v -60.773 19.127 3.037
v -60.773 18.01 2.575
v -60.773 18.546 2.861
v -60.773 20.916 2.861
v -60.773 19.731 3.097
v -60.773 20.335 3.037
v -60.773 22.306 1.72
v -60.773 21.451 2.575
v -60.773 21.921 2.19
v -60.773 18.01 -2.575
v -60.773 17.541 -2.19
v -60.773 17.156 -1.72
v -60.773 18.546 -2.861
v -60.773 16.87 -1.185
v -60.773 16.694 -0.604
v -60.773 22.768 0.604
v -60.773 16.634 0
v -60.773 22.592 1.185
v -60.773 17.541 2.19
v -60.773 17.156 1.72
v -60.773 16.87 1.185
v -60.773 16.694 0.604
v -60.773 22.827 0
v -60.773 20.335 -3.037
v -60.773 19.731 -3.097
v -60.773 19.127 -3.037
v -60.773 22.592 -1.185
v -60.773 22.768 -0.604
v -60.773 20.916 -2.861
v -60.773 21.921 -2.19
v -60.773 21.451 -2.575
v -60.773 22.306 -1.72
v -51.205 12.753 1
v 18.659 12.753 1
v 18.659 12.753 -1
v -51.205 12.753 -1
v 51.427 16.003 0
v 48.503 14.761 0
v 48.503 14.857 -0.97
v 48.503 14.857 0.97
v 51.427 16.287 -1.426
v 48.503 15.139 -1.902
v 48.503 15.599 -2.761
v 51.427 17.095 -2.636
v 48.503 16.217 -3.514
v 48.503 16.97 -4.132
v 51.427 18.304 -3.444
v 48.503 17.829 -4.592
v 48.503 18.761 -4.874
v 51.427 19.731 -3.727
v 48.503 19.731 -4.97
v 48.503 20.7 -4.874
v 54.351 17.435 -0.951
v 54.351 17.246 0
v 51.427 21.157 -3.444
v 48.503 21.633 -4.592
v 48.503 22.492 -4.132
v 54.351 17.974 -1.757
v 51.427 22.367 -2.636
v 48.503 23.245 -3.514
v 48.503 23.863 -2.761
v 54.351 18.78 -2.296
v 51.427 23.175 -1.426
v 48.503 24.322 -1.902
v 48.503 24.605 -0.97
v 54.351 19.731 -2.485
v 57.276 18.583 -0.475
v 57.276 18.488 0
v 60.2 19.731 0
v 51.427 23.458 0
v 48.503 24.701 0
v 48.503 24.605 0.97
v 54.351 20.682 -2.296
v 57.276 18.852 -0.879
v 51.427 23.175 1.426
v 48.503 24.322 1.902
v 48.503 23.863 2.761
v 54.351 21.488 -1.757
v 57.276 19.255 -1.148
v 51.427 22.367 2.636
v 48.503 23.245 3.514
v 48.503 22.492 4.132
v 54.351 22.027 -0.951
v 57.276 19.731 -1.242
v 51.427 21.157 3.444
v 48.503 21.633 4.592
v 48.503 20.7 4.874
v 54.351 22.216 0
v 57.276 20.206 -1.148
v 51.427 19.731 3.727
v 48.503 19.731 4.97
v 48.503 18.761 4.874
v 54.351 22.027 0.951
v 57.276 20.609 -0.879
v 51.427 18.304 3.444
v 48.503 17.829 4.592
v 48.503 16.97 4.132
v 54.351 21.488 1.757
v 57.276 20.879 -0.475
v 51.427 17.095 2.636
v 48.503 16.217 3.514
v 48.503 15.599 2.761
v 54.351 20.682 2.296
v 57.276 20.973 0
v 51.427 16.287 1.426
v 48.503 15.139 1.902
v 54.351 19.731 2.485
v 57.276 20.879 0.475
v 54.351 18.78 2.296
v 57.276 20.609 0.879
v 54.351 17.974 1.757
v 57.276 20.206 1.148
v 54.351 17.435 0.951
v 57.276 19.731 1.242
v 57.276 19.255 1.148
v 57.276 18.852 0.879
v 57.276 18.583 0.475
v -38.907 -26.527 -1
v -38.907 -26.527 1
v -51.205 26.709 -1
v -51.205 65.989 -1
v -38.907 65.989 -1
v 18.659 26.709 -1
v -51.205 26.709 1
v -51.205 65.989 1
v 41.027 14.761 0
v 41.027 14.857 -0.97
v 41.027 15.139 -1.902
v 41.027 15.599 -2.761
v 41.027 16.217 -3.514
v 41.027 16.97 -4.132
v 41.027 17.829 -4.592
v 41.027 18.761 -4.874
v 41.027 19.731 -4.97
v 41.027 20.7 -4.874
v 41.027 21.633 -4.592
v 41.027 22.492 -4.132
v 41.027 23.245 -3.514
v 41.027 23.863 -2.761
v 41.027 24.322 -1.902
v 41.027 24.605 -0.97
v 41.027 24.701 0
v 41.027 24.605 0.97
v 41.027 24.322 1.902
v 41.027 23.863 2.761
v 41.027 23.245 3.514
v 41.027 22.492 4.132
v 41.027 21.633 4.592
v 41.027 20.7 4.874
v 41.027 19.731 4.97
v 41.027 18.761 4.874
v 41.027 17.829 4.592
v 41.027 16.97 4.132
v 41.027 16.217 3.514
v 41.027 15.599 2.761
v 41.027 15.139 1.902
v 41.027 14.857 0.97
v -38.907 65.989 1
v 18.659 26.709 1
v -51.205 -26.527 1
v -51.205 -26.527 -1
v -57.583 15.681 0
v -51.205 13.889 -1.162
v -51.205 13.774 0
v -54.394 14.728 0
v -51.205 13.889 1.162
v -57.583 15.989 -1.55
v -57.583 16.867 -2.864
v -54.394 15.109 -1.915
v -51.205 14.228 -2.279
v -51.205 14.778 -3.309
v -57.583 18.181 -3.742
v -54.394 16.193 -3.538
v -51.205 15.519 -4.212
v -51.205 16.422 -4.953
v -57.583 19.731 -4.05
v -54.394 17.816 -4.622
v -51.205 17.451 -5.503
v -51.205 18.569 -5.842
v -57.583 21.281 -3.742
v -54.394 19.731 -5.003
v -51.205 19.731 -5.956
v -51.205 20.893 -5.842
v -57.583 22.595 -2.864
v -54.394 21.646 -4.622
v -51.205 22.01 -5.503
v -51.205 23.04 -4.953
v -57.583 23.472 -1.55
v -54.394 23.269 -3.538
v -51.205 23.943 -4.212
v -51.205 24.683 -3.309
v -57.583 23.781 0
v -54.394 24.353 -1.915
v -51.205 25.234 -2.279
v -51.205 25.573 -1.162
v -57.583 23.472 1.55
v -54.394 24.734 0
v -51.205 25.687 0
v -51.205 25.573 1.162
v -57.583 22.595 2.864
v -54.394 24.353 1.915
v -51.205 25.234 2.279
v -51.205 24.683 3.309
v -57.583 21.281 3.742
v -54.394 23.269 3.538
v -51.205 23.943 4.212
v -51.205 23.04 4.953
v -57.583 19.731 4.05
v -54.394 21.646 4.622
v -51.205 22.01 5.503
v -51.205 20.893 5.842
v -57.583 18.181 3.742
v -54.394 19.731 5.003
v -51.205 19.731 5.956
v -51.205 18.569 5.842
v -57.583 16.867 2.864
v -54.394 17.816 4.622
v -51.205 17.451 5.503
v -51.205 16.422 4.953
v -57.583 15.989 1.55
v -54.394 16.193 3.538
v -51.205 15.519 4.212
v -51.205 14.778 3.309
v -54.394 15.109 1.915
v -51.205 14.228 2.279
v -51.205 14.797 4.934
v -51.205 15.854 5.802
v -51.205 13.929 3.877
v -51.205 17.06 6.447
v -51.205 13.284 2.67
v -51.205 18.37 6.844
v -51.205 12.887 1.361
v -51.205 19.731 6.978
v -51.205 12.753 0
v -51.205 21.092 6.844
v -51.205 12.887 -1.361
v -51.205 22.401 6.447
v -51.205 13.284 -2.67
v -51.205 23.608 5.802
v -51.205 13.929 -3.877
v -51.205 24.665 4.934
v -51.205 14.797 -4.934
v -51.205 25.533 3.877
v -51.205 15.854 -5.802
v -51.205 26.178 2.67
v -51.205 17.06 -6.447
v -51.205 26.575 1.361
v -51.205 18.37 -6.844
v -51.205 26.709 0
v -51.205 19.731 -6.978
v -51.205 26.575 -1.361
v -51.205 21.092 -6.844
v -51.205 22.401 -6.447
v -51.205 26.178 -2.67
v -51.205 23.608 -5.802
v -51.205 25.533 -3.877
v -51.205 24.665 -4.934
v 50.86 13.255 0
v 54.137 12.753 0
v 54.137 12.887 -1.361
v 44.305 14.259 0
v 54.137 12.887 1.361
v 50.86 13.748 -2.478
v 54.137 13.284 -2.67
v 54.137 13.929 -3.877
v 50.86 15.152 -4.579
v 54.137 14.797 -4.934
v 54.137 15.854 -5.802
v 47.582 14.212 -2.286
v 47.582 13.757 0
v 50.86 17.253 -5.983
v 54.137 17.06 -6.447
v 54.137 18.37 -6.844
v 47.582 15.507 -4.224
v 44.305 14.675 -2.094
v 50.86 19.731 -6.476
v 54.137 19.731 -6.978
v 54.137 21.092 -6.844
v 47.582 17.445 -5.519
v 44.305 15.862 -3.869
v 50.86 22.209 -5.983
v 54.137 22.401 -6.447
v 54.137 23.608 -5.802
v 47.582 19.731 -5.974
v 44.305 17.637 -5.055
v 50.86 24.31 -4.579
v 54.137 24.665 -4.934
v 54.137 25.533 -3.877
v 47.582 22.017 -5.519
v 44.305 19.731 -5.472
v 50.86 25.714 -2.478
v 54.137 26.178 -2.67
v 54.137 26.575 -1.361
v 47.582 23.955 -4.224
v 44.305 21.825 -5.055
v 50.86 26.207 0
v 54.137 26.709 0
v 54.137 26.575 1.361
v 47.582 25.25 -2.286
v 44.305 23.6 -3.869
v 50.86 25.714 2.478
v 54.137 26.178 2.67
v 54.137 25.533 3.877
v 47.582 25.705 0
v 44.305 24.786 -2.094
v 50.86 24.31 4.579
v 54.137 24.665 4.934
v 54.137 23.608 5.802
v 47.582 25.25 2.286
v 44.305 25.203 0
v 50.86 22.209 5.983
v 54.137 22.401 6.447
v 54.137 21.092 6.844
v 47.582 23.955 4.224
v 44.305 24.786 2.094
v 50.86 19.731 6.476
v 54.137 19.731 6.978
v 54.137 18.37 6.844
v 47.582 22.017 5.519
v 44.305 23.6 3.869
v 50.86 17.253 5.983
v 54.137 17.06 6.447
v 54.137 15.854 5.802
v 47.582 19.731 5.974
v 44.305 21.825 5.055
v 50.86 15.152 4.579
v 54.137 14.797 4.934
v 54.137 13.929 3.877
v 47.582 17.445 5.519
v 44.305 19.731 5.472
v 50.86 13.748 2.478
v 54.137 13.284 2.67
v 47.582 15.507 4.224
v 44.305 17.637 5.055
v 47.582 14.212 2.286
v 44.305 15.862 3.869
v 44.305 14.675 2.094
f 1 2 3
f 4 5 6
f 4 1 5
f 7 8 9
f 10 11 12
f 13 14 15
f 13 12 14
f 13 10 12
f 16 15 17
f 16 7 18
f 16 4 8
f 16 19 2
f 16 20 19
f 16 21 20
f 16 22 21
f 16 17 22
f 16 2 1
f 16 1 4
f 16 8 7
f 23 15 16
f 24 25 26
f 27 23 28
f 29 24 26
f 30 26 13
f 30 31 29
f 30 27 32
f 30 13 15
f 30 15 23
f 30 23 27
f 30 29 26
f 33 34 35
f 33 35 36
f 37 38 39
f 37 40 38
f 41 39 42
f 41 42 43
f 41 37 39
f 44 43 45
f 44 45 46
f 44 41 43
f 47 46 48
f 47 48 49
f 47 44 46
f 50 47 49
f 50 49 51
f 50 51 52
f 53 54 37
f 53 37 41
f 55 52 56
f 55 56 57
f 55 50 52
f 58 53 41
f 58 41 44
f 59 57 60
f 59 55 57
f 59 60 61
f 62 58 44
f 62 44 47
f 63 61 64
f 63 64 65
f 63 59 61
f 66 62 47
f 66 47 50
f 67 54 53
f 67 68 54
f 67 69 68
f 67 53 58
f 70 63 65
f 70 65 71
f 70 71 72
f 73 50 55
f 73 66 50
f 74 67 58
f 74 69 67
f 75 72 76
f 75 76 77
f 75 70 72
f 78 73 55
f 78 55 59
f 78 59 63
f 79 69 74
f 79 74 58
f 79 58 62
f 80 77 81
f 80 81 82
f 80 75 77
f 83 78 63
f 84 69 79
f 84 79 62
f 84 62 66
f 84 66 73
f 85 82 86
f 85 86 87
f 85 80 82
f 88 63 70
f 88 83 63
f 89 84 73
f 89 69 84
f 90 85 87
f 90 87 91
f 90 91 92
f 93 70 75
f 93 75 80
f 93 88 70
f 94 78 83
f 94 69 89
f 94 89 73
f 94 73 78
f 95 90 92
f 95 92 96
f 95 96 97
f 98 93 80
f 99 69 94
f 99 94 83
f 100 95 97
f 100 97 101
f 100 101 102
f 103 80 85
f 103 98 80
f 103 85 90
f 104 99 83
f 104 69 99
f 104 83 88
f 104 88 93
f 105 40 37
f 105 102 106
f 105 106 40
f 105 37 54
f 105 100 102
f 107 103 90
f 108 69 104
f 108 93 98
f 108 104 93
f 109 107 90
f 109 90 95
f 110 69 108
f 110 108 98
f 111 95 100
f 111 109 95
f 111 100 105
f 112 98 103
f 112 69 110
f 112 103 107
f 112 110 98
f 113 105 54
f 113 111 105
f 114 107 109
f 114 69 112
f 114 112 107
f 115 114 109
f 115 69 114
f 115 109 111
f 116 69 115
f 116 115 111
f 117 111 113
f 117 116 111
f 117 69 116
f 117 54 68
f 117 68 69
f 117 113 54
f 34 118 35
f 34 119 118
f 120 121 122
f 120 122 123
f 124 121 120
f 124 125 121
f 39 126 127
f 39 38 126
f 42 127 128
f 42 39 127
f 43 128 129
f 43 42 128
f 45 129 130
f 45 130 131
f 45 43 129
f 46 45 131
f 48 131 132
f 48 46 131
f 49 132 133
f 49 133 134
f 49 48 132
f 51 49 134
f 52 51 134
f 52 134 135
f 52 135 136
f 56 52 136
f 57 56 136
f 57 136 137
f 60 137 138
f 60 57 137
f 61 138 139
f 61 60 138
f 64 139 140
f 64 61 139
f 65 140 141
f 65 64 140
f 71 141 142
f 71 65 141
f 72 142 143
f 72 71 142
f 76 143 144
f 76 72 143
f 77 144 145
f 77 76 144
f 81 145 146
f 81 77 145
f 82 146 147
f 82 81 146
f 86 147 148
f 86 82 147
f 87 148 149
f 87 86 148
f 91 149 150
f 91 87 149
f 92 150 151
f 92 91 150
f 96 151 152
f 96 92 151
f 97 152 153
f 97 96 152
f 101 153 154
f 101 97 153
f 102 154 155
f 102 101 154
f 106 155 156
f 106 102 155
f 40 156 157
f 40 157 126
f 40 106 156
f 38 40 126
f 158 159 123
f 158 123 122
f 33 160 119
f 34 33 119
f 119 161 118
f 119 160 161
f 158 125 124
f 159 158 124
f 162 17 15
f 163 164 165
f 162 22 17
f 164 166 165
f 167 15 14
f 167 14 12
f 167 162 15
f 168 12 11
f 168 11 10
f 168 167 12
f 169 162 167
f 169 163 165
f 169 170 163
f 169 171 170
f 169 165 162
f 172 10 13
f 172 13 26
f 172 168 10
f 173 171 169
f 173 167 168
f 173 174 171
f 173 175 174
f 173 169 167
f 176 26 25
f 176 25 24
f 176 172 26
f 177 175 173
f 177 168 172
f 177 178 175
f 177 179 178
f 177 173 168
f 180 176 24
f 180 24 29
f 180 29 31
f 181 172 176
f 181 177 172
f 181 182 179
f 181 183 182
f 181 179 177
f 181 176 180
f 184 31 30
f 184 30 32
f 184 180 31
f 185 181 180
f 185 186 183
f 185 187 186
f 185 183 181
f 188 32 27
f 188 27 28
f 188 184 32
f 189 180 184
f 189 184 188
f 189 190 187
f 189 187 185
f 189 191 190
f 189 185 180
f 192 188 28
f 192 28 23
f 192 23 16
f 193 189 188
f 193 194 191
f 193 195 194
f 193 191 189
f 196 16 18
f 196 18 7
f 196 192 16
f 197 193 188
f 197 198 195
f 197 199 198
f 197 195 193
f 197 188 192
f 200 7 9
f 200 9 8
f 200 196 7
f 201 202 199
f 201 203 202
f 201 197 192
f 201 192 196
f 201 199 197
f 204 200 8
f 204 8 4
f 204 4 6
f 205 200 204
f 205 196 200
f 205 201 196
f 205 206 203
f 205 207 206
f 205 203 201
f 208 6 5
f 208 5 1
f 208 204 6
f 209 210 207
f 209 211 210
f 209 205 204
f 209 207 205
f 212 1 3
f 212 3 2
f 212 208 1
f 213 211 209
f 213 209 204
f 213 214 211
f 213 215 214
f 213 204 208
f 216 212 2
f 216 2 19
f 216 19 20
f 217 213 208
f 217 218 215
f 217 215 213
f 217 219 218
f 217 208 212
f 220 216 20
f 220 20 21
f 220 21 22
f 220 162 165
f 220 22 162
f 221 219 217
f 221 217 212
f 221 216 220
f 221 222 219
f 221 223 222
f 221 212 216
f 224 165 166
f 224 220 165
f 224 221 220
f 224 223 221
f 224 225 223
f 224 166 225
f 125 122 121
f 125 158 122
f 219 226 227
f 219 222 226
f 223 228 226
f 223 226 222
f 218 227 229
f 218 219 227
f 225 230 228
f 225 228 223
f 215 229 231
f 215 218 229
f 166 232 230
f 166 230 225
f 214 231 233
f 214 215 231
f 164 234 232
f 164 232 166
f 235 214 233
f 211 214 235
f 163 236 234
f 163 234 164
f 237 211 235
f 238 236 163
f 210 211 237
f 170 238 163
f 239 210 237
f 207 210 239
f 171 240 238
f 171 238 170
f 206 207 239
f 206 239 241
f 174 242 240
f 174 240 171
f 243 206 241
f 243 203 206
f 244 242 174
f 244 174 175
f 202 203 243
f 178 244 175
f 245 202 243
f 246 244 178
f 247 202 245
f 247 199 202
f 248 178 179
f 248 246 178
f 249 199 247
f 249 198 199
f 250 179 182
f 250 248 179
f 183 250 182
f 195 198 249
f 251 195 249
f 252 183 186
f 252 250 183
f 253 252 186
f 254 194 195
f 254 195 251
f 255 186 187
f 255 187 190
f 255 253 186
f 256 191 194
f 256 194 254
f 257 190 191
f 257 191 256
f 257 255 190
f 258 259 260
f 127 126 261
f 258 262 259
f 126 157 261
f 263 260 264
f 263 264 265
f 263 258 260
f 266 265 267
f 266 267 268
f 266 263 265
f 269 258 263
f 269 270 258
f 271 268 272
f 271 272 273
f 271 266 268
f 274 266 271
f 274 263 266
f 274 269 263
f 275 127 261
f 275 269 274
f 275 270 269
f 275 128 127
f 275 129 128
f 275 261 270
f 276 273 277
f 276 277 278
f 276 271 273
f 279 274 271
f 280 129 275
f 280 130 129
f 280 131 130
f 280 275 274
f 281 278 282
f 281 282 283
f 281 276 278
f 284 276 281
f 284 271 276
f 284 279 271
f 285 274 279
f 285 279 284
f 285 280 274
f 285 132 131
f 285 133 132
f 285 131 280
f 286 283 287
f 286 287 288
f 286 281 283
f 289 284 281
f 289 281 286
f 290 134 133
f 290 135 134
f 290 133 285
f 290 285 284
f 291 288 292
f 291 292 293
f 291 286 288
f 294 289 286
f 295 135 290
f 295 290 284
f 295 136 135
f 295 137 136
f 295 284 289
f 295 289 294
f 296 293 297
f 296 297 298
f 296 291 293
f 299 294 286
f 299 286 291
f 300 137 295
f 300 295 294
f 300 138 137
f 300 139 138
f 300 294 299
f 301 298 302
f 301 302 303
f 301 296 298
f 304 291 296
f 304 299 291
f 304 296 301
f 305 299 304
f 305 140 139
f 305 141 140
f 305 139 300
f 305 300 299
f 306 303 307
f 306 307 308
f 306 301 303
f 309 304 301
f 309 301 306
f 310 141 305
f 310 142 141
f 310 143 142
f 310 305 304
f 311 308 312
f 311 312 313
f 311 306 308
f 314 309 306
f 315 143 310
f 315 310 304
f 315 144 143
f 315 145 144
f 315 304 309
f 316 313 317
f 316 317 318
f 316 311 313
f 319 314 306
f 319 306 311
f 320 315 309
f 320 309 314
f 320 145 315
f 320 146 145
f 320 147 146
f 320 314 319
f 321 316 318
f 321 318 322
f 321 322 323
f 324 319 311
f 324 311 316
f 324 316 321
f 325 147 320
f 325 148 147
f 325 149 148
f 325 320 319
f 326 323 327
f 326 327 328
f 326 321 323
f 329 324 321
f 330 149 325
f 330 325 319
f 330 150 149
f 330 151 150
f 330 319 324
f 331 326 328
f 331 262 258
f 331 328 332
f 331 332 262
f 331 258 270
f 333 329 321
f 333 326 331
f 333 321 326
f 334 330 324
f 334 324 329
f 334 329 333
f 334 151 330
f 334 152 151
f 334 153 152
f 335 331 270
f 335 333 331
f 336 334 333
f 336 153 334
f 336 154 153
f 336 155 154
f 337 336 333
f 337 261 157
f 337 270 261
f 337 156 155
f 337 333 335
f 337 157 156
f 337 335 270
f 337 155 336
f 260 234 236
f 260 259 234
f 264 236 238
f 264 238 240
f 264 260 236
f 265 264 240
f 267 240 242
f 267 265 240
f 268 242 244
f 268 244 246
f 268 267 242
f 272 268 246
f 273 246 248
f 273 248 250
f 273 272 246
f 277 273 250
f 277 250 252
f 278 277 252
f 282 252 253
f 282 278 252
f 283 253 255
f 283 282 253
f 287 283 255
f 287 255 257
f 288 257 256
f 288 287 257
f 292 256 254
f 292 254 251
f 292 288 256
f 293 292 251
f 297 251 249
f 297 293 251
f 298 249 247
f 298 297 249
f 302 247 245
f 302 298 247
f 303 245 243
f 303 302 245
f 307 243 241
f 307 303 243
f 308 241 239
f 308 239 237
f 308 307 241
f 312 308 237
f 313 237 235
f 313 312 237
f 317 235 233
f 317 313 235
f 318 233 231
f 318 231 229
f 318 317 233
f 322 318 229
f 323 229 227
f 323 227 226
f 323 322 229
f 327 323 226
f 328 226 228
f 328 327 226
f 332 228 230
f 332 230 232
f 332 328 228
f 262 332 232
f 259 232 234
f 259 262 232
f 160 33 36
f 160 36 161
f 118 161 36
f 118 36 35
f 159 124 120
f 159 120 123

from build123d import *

# Parameters (mm, degrees)
F3_DEPTH      = 1
F3_DEPTH_BACK = 1


with BuildPart() as f1:
    # F0 (on Top) → F1 (revolve)
    with BuildSketch(Plane.XY):
        Polygon((60.1996816695, 19.7308845818), (-60.7725344598, 19.7308845818), (-60.7725344598, 16.6342694638), (-51.2052008978, 13.7744341046), (-51.2052008978, 12.7527546138), (24.6576368012, 12.7527546138), (33.5514515318, 14.7610362619), (41.0273786474, 14.7610362619), (48.503305763, 14.7610362619), align=None)
        Polygon((54.1369915009, 12.7527546138), (41.0273786474, 14.7610362619), (33.5514515318, 14.7610362619), (24.6576368012, 12.7527546138), align=None)
    revolve(axis=Axis((-0.2864263952, 19.7308845818, 0), (1, 0, 0)))


with BuildPart() as f3:
    # F2 (on Top) → F3 (new body, two sides)
    with BuildSketch(Plane.XY) as f3_sk:
        Polygon((-51.2052008978, 65.988779068), (-51.2052008978, 26.7090145499), (18.6587013304, 26.7090145499), (-38.9073677361, 65.988779068), align=None)
    extrude(amount=F3_DEPTH)
    extrude(f3_sk.sketch, amount=-F3_DEPTH_BACK)


with BuildPart() as f3b:
    # F2 (on Top) → F3, piece 2 (new body, two sides)
    with BuildSketch(Plane.XY) as f3_2_sk:
        Polygon((-38.9073677361, -26.5270099044), (18.6587013304, 12.7527546138), (-51.2052008978, 12.7527546138), (-51.2052008978, -26.5270099044), align=None)
    extrude(amount=F3_DEPTH)
    extrude(f3_2_sk.sketch, amount=-F3_DEPTH_BACK)


solid = Compound([f1.part, f3.part, f3b.part])
